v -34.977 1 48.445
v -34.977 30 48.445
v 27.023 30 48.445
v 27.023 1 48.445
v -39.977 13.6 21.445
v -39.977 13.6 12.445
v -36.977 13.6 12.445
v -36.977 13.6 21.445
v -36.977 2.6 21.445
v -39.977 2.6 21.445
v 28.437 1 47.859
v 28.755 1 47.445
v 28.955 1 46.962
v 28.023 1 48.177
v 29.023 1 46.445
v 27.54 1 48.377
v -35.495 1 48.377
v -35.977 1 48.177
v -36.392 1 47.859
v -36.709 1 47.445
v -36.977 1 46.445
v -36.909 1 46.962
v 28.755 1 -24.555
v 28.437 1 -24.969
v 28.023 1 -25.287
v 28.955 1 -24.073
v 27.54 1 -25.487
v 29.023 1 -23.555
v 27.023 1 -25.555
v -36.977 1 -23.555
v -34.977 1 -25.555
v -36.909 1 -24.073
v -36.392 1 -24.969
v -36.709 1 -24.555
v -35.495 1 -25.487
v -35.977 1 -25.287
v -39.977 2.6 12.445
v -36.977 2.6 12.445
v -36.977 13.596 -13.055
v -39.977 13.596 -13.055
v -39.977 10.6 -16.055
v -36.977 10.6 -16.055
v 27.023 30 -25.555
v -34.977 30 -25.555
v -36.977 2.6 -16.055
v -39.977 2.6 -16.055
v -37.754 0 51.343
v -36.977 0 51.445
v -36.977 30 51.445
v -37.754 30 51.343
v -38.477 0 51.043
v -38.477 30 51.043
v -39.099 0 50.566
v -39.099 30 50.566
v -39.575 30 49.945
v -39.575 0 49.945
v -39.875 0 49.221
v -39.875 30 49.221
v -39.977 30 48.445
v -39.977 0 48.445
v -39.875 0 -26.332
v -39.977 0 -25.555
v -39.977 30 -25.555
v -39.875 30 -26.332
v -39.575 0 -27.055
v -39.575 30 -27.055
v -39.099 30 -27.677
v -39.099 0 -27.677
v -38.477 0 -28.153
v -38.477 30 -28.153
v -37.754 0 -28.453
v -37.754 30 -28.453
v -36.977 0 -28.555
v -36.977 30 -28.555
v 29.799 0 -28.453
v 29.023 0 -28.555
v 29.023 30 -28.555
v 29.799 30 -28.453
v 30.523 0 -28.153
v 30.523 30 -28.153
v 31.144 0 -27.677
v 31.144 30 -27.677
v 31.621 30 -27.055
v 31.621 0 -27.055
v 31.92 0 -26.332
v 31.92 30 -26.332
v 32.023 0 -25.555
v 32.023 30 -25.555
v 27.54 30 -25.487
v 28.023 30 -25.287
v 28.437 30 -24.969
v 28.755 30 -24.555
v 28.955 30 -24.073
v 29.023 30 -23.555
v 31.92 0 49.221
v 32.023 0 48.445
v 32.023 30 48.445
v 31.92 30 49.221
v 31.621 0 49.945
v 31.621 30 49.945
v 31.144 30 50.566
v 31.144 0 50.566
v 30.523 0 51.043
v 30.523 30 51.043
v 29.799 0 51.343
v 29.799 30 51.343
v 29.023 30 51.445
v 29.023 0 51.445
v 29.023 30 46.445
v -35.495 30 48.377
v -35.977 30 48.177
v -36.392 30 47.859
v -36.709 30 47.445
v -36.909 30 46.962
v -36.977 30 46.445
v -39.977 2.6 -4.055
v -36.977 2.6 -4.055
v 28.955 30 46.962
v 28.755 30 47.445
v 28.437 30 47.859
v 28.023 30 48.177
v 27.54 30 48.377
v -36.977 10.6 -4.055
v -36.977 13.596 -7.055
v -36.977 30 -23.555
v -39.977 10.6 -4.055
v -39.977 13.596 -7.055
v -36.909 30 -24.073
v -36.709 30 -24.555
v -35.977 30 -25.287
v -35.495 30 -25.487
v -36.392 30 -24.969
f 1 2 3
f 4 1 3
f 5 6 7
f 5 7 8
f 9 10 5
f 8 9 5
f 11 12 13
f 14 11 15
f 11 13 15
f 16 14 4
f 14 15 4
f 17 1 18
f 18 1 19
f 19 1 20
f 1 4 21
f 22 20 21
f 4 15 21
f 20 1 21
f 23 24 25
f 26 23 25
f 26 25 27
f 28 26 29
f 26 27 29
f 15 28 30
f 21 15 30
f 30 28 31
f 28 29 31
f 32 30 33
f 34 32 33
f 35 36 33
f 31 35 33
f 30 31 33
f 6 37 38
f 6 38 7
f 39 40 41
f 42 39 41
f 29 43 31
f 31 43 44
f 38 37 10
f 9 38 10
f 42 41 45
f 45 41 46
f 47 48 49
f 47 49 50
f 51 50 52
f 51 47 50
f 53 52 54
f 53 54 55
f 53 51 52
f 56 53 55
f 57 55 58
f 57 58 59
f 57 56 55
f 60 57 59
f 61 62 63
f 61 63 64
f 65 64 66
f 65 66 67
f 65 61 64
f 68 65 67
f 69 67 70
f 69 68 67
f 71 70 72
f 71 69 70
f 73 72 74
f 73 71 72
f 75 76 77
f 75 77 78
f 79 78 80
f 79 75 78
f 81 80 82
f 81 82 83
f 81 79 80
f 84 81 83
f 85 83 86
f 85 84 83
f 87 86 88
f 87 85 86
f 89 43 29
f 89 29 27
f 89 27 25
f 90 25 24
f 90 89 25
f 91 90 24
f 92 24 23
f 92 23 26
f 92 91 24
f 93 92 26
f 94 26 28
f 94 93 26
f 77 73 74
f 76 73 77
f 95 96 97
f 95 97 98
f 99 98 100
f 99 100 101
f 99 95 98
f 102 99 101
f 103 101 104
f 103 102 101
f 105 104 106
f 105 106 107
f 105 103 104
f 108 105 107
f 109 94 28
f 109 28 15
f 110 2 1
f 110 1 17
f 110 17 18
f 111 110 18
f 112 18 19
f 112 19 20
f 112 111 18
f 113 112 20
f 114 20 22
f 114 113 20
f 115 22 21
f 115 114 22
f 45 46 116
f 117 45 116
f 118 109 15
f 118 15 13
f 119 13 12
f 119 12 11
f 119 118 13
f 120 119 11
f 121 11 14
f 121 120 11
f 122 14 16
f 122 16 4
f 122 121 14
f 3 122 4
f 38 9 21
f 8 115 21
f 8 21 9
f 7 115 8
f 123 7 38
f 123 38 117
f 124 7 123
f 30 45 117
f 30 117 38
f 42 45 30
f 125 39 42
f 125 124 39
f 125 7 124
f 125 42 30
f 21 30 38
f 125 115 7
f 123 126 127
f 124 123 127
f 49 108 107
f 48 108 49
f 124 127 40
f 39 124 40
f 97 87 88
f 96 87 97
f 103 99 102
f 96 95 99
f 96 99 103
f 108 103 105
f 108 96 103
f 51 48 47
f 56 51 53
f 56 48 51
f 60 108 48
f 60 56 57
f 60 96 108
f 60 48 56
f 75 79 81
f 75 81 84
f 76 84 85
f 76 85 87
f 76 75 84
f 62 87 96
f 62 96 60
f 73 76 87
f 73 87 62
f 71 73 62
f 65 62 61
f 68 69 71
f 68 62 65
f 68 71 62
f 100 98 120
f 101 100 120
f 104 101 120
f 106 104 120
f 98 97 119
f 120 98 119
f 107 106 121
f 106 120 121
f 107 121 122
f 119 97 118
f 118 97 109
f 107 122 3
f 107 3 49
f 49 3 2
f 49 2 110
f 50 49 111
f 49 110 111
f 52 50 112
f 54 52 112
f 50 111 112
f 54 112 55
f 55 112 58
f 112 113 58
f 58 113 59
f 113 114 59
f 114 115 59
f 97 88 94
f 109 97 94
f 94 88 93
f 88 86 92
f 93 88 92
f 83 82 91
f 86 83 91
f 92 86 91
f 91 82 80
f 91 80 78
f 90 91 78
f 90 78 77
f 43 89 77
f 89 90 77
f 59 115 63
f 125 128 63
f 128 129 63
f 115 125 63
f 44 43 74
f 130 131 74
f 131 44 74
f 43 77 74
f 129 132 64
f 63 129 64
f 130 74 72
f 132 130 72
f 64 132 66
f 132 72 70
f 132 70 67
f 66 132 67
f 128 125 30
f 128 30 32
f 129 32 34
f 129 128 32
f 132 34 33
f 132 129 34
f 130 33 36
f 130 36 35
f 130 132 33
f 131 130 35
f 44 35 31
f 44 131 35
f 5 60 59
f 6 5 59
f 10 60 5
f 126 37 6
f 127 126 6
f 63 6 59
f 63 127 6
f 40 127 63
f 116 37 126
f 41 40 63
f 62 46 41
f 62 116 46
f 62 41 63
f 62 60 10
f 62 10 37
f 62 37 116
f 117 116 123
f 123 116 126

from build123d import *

# Parameters (mm, degrees)
BOSS_EXTRUDE1_DEPTH = 30
CUT_EXTRUDE1_DEPTH  = 29
CUT_EXTRUDE3_DEPTH  = 10
SKETCH6_W           = 27.115913197
SKETCH6_H           = 16.602687323
BOSS_EXTRUDE2_DEPTH = 3
SKETCH7_W           = 8.89
SKETCH7_H           = 10.922
CUT_EXTRUDE4_DEPTH  = 6350
BOSS_EXTRUDE3_START = -3
SKETCH8_W           = 8.89
SKETCH8_H           = 10.922
BOSS_EXTRUDE3_DEPTH = 3
BOSS_EXTRUDE4_START = -3
SKETCH9_W           = 8.89
SKETCH9_H           = 10.922
BOSS_EXTRUDE4_DEPTH = 3
SKETCH12_W          = 9
SKETCH12_H          = 11
CUT_EXTRUDE6_DEPTH  = 3


with BuildPart() as part:
    # Sketch2 → Boss-Extrude1 (new body)
    with BuildSketch(Plane(origin=(0, 0, 0), x_dir=(1, 0, 0), z_dir=(0, 1, 0))):
        with BuildLine():
            Line((-36.97733711, 28.555240793), (29.02266289, 28.555240793))
            ThreePointArc((29.02266289, 28.555240793), (31.143983233, 27.676561137), (32.02266289, 25.555240793))
            Line((32.02266289, 25.555240793), (32.02266289, -48.444759207))
            ThreePointArc((32.02266289, -48.444759207), (31.143983233, -50.56607955), (29.02266289, -51.444759207))
            Line((29.02266289, -51.444759207), (-36.97733711, -51.444759207))
            ThreePointArc((-36.97733711, -51.444759207), (-39.098657454, -50.56607955), (-39.97733711, -48.444759207))
            Line((-39.97733711, -48.444759207), (-39.97733711, 25.555240793))
            ThreePointArc((-39.97733711, 25.555240793), (-39.098657454, 27.676561137), (-36.97733711, 28.555240793))
        make_face()
    extrude(amount=BOSS_EXTRUDE1_DEPTH)

    # Sketch3 → Cut-Extrude1 (cut)
    with BuildSketch(Plane(origin=(0, 30, 0), x_dir=(1, 0, 0), z_dir=(0, 1, 0))):
        with BuildLine():
            Line((-34.97733711, 25.555240793), (27.02266289, 25.555240793))
            ThreePointArc((27.02266289, 25.555240793), (28.436876452, 24.969454356), (29.02266289, 23.555240793))
            Line((29.02266289, 23.555240793), (29.02266289, -46.444759207))
            ThreePointArc((29.02266289, -46.444759207), (28.436876452, -47.858972769), (27.02266289, -48.444759207))
            Line((27.02266289, -48.444759207), (-34.97733711, -48.444759207))
            ThreePointArc((-34.97733711, -48.444759207), (-36.391550673, -47.858972769), (-36.97733711, -46.444759207))
            Line((-36.97733711, -46.444759207), (-36.97733711, 23.555240793))
            ThreePointArc((-36.97733711, 23.555240793), (-36.391550673, 24.969454356), (-34.97733711, 25.555240793))
        make_face()
    extrude(amount=-CUT_EXTRUDE1_DEPTH, mode=Mode.SUBTRACT)

    # Sketch5 → Cut-Extrude3 (cut)
    with BuildSketch(Plane.ZY.offset(39.97733711)):
        Polygon((14.109885792, 14.391226726), (9.109885792, 14.391226726), (6.109885792, 11.394962385), (6.109885792, 2.391226726), (17.109885792, 2.391226726), (17.109885792, 11.394962385), align=None)
    extrude(amount=-CUT_EXTRUDE3_DEPTH, mode=Mode.SUBTRACT)

    # Sketch6 → Boss-Extrude2 (add)
    with BuildSketch(Plane.ZY.offset(39.97733711)):
        with Locations((11.822368645, 9.478185332)):
            Rectangle(SKETCH6_W, SKETCH6_H)
    extrude(amount=-BOSS_EXTRUDE2_DEPTH)

    # Sketch7 → Cut-Extrude4 (cut)
    with BuildSketch(Plane.XY.offset(51.444759207)):
        Polygon((-29.154490055, 10.403434977), (-26.106490055, 13.462), (-20.275055078, 13.462), (-17.216490055, 10.414), (-17.216490055, 2.54), (-29.154490055, 2.54), align=None)
        with Locations((19.417783934, 8.001)):
            Rectangle(SKETCH7_W, SKETCH7_H)
    extrude(amount=-CUT_EXTRUDE4_DEPTH, mode=Mode.SUBTRACT)

    # Sketch8 → Boss-Extrude3 (add)
    with BuildSketch(Plane(origin=(0, 0, -28.555240793), x_dir=(-1, 0, 0), z_dir=(0, 0, -1)).offset(BOSS_EXTRUDE3_START)):
        Polygon((26.106490055, 13.462), (20.275055078, 13.462), (17.216490055, 10.414), (17.216490055, 2.54), (29.154490055, 2.54), (29.154490055, 10.403434977), align=None)
        with Locations((-19.417783934, 8.001)):
            Rectangle(SKETCH8_W, SKETCH8_H)
    extrude(amount=BOSS_EXTRUDE3_DEPTH)

    # Sketch9 → Boss-Extrude4 (add)
    with BuildSketch(Plane.XY.offset(51.444759207).offset(BOSS_EXTRUDE4_START)):
        Polygon((-29.154490055, 2.54), (-17.216490055, 2.54), (-17.216490055, 10.414), (-20.275055078, 13.462), (-26.106490055, 13.462), (-29.154490055, 10.403434977), align=None)
        with Locations((19.417783934, 8.001)):
            Rectangle(SKETCH9_W, SKETCH9_H)
    extrude(amount=BOSS_EXTRUDE4_DEPTH)

    # Sketch12 → Cut-Extrude6 (cut)
    with BuildSketch(Plane.ZY.offset(39.97733711)):
        Polygon((-16.055240793, 10.6), (-16.055240793, 2.6), (-4.055240793, 2.6), (-4.055240793, 10.6), (-7.055240793, 13.596264341), (-13.055240793, 13.596264341), align=None)
        with Locations((16.944759207, 8.1)):
            Rectangle(SKETCH12_W, SKETCH12_H)
    extrude(amount=-CUT_EXTRUDE6_DEPTH, mode=Mode.SUBTRACT)


solid = part.part
